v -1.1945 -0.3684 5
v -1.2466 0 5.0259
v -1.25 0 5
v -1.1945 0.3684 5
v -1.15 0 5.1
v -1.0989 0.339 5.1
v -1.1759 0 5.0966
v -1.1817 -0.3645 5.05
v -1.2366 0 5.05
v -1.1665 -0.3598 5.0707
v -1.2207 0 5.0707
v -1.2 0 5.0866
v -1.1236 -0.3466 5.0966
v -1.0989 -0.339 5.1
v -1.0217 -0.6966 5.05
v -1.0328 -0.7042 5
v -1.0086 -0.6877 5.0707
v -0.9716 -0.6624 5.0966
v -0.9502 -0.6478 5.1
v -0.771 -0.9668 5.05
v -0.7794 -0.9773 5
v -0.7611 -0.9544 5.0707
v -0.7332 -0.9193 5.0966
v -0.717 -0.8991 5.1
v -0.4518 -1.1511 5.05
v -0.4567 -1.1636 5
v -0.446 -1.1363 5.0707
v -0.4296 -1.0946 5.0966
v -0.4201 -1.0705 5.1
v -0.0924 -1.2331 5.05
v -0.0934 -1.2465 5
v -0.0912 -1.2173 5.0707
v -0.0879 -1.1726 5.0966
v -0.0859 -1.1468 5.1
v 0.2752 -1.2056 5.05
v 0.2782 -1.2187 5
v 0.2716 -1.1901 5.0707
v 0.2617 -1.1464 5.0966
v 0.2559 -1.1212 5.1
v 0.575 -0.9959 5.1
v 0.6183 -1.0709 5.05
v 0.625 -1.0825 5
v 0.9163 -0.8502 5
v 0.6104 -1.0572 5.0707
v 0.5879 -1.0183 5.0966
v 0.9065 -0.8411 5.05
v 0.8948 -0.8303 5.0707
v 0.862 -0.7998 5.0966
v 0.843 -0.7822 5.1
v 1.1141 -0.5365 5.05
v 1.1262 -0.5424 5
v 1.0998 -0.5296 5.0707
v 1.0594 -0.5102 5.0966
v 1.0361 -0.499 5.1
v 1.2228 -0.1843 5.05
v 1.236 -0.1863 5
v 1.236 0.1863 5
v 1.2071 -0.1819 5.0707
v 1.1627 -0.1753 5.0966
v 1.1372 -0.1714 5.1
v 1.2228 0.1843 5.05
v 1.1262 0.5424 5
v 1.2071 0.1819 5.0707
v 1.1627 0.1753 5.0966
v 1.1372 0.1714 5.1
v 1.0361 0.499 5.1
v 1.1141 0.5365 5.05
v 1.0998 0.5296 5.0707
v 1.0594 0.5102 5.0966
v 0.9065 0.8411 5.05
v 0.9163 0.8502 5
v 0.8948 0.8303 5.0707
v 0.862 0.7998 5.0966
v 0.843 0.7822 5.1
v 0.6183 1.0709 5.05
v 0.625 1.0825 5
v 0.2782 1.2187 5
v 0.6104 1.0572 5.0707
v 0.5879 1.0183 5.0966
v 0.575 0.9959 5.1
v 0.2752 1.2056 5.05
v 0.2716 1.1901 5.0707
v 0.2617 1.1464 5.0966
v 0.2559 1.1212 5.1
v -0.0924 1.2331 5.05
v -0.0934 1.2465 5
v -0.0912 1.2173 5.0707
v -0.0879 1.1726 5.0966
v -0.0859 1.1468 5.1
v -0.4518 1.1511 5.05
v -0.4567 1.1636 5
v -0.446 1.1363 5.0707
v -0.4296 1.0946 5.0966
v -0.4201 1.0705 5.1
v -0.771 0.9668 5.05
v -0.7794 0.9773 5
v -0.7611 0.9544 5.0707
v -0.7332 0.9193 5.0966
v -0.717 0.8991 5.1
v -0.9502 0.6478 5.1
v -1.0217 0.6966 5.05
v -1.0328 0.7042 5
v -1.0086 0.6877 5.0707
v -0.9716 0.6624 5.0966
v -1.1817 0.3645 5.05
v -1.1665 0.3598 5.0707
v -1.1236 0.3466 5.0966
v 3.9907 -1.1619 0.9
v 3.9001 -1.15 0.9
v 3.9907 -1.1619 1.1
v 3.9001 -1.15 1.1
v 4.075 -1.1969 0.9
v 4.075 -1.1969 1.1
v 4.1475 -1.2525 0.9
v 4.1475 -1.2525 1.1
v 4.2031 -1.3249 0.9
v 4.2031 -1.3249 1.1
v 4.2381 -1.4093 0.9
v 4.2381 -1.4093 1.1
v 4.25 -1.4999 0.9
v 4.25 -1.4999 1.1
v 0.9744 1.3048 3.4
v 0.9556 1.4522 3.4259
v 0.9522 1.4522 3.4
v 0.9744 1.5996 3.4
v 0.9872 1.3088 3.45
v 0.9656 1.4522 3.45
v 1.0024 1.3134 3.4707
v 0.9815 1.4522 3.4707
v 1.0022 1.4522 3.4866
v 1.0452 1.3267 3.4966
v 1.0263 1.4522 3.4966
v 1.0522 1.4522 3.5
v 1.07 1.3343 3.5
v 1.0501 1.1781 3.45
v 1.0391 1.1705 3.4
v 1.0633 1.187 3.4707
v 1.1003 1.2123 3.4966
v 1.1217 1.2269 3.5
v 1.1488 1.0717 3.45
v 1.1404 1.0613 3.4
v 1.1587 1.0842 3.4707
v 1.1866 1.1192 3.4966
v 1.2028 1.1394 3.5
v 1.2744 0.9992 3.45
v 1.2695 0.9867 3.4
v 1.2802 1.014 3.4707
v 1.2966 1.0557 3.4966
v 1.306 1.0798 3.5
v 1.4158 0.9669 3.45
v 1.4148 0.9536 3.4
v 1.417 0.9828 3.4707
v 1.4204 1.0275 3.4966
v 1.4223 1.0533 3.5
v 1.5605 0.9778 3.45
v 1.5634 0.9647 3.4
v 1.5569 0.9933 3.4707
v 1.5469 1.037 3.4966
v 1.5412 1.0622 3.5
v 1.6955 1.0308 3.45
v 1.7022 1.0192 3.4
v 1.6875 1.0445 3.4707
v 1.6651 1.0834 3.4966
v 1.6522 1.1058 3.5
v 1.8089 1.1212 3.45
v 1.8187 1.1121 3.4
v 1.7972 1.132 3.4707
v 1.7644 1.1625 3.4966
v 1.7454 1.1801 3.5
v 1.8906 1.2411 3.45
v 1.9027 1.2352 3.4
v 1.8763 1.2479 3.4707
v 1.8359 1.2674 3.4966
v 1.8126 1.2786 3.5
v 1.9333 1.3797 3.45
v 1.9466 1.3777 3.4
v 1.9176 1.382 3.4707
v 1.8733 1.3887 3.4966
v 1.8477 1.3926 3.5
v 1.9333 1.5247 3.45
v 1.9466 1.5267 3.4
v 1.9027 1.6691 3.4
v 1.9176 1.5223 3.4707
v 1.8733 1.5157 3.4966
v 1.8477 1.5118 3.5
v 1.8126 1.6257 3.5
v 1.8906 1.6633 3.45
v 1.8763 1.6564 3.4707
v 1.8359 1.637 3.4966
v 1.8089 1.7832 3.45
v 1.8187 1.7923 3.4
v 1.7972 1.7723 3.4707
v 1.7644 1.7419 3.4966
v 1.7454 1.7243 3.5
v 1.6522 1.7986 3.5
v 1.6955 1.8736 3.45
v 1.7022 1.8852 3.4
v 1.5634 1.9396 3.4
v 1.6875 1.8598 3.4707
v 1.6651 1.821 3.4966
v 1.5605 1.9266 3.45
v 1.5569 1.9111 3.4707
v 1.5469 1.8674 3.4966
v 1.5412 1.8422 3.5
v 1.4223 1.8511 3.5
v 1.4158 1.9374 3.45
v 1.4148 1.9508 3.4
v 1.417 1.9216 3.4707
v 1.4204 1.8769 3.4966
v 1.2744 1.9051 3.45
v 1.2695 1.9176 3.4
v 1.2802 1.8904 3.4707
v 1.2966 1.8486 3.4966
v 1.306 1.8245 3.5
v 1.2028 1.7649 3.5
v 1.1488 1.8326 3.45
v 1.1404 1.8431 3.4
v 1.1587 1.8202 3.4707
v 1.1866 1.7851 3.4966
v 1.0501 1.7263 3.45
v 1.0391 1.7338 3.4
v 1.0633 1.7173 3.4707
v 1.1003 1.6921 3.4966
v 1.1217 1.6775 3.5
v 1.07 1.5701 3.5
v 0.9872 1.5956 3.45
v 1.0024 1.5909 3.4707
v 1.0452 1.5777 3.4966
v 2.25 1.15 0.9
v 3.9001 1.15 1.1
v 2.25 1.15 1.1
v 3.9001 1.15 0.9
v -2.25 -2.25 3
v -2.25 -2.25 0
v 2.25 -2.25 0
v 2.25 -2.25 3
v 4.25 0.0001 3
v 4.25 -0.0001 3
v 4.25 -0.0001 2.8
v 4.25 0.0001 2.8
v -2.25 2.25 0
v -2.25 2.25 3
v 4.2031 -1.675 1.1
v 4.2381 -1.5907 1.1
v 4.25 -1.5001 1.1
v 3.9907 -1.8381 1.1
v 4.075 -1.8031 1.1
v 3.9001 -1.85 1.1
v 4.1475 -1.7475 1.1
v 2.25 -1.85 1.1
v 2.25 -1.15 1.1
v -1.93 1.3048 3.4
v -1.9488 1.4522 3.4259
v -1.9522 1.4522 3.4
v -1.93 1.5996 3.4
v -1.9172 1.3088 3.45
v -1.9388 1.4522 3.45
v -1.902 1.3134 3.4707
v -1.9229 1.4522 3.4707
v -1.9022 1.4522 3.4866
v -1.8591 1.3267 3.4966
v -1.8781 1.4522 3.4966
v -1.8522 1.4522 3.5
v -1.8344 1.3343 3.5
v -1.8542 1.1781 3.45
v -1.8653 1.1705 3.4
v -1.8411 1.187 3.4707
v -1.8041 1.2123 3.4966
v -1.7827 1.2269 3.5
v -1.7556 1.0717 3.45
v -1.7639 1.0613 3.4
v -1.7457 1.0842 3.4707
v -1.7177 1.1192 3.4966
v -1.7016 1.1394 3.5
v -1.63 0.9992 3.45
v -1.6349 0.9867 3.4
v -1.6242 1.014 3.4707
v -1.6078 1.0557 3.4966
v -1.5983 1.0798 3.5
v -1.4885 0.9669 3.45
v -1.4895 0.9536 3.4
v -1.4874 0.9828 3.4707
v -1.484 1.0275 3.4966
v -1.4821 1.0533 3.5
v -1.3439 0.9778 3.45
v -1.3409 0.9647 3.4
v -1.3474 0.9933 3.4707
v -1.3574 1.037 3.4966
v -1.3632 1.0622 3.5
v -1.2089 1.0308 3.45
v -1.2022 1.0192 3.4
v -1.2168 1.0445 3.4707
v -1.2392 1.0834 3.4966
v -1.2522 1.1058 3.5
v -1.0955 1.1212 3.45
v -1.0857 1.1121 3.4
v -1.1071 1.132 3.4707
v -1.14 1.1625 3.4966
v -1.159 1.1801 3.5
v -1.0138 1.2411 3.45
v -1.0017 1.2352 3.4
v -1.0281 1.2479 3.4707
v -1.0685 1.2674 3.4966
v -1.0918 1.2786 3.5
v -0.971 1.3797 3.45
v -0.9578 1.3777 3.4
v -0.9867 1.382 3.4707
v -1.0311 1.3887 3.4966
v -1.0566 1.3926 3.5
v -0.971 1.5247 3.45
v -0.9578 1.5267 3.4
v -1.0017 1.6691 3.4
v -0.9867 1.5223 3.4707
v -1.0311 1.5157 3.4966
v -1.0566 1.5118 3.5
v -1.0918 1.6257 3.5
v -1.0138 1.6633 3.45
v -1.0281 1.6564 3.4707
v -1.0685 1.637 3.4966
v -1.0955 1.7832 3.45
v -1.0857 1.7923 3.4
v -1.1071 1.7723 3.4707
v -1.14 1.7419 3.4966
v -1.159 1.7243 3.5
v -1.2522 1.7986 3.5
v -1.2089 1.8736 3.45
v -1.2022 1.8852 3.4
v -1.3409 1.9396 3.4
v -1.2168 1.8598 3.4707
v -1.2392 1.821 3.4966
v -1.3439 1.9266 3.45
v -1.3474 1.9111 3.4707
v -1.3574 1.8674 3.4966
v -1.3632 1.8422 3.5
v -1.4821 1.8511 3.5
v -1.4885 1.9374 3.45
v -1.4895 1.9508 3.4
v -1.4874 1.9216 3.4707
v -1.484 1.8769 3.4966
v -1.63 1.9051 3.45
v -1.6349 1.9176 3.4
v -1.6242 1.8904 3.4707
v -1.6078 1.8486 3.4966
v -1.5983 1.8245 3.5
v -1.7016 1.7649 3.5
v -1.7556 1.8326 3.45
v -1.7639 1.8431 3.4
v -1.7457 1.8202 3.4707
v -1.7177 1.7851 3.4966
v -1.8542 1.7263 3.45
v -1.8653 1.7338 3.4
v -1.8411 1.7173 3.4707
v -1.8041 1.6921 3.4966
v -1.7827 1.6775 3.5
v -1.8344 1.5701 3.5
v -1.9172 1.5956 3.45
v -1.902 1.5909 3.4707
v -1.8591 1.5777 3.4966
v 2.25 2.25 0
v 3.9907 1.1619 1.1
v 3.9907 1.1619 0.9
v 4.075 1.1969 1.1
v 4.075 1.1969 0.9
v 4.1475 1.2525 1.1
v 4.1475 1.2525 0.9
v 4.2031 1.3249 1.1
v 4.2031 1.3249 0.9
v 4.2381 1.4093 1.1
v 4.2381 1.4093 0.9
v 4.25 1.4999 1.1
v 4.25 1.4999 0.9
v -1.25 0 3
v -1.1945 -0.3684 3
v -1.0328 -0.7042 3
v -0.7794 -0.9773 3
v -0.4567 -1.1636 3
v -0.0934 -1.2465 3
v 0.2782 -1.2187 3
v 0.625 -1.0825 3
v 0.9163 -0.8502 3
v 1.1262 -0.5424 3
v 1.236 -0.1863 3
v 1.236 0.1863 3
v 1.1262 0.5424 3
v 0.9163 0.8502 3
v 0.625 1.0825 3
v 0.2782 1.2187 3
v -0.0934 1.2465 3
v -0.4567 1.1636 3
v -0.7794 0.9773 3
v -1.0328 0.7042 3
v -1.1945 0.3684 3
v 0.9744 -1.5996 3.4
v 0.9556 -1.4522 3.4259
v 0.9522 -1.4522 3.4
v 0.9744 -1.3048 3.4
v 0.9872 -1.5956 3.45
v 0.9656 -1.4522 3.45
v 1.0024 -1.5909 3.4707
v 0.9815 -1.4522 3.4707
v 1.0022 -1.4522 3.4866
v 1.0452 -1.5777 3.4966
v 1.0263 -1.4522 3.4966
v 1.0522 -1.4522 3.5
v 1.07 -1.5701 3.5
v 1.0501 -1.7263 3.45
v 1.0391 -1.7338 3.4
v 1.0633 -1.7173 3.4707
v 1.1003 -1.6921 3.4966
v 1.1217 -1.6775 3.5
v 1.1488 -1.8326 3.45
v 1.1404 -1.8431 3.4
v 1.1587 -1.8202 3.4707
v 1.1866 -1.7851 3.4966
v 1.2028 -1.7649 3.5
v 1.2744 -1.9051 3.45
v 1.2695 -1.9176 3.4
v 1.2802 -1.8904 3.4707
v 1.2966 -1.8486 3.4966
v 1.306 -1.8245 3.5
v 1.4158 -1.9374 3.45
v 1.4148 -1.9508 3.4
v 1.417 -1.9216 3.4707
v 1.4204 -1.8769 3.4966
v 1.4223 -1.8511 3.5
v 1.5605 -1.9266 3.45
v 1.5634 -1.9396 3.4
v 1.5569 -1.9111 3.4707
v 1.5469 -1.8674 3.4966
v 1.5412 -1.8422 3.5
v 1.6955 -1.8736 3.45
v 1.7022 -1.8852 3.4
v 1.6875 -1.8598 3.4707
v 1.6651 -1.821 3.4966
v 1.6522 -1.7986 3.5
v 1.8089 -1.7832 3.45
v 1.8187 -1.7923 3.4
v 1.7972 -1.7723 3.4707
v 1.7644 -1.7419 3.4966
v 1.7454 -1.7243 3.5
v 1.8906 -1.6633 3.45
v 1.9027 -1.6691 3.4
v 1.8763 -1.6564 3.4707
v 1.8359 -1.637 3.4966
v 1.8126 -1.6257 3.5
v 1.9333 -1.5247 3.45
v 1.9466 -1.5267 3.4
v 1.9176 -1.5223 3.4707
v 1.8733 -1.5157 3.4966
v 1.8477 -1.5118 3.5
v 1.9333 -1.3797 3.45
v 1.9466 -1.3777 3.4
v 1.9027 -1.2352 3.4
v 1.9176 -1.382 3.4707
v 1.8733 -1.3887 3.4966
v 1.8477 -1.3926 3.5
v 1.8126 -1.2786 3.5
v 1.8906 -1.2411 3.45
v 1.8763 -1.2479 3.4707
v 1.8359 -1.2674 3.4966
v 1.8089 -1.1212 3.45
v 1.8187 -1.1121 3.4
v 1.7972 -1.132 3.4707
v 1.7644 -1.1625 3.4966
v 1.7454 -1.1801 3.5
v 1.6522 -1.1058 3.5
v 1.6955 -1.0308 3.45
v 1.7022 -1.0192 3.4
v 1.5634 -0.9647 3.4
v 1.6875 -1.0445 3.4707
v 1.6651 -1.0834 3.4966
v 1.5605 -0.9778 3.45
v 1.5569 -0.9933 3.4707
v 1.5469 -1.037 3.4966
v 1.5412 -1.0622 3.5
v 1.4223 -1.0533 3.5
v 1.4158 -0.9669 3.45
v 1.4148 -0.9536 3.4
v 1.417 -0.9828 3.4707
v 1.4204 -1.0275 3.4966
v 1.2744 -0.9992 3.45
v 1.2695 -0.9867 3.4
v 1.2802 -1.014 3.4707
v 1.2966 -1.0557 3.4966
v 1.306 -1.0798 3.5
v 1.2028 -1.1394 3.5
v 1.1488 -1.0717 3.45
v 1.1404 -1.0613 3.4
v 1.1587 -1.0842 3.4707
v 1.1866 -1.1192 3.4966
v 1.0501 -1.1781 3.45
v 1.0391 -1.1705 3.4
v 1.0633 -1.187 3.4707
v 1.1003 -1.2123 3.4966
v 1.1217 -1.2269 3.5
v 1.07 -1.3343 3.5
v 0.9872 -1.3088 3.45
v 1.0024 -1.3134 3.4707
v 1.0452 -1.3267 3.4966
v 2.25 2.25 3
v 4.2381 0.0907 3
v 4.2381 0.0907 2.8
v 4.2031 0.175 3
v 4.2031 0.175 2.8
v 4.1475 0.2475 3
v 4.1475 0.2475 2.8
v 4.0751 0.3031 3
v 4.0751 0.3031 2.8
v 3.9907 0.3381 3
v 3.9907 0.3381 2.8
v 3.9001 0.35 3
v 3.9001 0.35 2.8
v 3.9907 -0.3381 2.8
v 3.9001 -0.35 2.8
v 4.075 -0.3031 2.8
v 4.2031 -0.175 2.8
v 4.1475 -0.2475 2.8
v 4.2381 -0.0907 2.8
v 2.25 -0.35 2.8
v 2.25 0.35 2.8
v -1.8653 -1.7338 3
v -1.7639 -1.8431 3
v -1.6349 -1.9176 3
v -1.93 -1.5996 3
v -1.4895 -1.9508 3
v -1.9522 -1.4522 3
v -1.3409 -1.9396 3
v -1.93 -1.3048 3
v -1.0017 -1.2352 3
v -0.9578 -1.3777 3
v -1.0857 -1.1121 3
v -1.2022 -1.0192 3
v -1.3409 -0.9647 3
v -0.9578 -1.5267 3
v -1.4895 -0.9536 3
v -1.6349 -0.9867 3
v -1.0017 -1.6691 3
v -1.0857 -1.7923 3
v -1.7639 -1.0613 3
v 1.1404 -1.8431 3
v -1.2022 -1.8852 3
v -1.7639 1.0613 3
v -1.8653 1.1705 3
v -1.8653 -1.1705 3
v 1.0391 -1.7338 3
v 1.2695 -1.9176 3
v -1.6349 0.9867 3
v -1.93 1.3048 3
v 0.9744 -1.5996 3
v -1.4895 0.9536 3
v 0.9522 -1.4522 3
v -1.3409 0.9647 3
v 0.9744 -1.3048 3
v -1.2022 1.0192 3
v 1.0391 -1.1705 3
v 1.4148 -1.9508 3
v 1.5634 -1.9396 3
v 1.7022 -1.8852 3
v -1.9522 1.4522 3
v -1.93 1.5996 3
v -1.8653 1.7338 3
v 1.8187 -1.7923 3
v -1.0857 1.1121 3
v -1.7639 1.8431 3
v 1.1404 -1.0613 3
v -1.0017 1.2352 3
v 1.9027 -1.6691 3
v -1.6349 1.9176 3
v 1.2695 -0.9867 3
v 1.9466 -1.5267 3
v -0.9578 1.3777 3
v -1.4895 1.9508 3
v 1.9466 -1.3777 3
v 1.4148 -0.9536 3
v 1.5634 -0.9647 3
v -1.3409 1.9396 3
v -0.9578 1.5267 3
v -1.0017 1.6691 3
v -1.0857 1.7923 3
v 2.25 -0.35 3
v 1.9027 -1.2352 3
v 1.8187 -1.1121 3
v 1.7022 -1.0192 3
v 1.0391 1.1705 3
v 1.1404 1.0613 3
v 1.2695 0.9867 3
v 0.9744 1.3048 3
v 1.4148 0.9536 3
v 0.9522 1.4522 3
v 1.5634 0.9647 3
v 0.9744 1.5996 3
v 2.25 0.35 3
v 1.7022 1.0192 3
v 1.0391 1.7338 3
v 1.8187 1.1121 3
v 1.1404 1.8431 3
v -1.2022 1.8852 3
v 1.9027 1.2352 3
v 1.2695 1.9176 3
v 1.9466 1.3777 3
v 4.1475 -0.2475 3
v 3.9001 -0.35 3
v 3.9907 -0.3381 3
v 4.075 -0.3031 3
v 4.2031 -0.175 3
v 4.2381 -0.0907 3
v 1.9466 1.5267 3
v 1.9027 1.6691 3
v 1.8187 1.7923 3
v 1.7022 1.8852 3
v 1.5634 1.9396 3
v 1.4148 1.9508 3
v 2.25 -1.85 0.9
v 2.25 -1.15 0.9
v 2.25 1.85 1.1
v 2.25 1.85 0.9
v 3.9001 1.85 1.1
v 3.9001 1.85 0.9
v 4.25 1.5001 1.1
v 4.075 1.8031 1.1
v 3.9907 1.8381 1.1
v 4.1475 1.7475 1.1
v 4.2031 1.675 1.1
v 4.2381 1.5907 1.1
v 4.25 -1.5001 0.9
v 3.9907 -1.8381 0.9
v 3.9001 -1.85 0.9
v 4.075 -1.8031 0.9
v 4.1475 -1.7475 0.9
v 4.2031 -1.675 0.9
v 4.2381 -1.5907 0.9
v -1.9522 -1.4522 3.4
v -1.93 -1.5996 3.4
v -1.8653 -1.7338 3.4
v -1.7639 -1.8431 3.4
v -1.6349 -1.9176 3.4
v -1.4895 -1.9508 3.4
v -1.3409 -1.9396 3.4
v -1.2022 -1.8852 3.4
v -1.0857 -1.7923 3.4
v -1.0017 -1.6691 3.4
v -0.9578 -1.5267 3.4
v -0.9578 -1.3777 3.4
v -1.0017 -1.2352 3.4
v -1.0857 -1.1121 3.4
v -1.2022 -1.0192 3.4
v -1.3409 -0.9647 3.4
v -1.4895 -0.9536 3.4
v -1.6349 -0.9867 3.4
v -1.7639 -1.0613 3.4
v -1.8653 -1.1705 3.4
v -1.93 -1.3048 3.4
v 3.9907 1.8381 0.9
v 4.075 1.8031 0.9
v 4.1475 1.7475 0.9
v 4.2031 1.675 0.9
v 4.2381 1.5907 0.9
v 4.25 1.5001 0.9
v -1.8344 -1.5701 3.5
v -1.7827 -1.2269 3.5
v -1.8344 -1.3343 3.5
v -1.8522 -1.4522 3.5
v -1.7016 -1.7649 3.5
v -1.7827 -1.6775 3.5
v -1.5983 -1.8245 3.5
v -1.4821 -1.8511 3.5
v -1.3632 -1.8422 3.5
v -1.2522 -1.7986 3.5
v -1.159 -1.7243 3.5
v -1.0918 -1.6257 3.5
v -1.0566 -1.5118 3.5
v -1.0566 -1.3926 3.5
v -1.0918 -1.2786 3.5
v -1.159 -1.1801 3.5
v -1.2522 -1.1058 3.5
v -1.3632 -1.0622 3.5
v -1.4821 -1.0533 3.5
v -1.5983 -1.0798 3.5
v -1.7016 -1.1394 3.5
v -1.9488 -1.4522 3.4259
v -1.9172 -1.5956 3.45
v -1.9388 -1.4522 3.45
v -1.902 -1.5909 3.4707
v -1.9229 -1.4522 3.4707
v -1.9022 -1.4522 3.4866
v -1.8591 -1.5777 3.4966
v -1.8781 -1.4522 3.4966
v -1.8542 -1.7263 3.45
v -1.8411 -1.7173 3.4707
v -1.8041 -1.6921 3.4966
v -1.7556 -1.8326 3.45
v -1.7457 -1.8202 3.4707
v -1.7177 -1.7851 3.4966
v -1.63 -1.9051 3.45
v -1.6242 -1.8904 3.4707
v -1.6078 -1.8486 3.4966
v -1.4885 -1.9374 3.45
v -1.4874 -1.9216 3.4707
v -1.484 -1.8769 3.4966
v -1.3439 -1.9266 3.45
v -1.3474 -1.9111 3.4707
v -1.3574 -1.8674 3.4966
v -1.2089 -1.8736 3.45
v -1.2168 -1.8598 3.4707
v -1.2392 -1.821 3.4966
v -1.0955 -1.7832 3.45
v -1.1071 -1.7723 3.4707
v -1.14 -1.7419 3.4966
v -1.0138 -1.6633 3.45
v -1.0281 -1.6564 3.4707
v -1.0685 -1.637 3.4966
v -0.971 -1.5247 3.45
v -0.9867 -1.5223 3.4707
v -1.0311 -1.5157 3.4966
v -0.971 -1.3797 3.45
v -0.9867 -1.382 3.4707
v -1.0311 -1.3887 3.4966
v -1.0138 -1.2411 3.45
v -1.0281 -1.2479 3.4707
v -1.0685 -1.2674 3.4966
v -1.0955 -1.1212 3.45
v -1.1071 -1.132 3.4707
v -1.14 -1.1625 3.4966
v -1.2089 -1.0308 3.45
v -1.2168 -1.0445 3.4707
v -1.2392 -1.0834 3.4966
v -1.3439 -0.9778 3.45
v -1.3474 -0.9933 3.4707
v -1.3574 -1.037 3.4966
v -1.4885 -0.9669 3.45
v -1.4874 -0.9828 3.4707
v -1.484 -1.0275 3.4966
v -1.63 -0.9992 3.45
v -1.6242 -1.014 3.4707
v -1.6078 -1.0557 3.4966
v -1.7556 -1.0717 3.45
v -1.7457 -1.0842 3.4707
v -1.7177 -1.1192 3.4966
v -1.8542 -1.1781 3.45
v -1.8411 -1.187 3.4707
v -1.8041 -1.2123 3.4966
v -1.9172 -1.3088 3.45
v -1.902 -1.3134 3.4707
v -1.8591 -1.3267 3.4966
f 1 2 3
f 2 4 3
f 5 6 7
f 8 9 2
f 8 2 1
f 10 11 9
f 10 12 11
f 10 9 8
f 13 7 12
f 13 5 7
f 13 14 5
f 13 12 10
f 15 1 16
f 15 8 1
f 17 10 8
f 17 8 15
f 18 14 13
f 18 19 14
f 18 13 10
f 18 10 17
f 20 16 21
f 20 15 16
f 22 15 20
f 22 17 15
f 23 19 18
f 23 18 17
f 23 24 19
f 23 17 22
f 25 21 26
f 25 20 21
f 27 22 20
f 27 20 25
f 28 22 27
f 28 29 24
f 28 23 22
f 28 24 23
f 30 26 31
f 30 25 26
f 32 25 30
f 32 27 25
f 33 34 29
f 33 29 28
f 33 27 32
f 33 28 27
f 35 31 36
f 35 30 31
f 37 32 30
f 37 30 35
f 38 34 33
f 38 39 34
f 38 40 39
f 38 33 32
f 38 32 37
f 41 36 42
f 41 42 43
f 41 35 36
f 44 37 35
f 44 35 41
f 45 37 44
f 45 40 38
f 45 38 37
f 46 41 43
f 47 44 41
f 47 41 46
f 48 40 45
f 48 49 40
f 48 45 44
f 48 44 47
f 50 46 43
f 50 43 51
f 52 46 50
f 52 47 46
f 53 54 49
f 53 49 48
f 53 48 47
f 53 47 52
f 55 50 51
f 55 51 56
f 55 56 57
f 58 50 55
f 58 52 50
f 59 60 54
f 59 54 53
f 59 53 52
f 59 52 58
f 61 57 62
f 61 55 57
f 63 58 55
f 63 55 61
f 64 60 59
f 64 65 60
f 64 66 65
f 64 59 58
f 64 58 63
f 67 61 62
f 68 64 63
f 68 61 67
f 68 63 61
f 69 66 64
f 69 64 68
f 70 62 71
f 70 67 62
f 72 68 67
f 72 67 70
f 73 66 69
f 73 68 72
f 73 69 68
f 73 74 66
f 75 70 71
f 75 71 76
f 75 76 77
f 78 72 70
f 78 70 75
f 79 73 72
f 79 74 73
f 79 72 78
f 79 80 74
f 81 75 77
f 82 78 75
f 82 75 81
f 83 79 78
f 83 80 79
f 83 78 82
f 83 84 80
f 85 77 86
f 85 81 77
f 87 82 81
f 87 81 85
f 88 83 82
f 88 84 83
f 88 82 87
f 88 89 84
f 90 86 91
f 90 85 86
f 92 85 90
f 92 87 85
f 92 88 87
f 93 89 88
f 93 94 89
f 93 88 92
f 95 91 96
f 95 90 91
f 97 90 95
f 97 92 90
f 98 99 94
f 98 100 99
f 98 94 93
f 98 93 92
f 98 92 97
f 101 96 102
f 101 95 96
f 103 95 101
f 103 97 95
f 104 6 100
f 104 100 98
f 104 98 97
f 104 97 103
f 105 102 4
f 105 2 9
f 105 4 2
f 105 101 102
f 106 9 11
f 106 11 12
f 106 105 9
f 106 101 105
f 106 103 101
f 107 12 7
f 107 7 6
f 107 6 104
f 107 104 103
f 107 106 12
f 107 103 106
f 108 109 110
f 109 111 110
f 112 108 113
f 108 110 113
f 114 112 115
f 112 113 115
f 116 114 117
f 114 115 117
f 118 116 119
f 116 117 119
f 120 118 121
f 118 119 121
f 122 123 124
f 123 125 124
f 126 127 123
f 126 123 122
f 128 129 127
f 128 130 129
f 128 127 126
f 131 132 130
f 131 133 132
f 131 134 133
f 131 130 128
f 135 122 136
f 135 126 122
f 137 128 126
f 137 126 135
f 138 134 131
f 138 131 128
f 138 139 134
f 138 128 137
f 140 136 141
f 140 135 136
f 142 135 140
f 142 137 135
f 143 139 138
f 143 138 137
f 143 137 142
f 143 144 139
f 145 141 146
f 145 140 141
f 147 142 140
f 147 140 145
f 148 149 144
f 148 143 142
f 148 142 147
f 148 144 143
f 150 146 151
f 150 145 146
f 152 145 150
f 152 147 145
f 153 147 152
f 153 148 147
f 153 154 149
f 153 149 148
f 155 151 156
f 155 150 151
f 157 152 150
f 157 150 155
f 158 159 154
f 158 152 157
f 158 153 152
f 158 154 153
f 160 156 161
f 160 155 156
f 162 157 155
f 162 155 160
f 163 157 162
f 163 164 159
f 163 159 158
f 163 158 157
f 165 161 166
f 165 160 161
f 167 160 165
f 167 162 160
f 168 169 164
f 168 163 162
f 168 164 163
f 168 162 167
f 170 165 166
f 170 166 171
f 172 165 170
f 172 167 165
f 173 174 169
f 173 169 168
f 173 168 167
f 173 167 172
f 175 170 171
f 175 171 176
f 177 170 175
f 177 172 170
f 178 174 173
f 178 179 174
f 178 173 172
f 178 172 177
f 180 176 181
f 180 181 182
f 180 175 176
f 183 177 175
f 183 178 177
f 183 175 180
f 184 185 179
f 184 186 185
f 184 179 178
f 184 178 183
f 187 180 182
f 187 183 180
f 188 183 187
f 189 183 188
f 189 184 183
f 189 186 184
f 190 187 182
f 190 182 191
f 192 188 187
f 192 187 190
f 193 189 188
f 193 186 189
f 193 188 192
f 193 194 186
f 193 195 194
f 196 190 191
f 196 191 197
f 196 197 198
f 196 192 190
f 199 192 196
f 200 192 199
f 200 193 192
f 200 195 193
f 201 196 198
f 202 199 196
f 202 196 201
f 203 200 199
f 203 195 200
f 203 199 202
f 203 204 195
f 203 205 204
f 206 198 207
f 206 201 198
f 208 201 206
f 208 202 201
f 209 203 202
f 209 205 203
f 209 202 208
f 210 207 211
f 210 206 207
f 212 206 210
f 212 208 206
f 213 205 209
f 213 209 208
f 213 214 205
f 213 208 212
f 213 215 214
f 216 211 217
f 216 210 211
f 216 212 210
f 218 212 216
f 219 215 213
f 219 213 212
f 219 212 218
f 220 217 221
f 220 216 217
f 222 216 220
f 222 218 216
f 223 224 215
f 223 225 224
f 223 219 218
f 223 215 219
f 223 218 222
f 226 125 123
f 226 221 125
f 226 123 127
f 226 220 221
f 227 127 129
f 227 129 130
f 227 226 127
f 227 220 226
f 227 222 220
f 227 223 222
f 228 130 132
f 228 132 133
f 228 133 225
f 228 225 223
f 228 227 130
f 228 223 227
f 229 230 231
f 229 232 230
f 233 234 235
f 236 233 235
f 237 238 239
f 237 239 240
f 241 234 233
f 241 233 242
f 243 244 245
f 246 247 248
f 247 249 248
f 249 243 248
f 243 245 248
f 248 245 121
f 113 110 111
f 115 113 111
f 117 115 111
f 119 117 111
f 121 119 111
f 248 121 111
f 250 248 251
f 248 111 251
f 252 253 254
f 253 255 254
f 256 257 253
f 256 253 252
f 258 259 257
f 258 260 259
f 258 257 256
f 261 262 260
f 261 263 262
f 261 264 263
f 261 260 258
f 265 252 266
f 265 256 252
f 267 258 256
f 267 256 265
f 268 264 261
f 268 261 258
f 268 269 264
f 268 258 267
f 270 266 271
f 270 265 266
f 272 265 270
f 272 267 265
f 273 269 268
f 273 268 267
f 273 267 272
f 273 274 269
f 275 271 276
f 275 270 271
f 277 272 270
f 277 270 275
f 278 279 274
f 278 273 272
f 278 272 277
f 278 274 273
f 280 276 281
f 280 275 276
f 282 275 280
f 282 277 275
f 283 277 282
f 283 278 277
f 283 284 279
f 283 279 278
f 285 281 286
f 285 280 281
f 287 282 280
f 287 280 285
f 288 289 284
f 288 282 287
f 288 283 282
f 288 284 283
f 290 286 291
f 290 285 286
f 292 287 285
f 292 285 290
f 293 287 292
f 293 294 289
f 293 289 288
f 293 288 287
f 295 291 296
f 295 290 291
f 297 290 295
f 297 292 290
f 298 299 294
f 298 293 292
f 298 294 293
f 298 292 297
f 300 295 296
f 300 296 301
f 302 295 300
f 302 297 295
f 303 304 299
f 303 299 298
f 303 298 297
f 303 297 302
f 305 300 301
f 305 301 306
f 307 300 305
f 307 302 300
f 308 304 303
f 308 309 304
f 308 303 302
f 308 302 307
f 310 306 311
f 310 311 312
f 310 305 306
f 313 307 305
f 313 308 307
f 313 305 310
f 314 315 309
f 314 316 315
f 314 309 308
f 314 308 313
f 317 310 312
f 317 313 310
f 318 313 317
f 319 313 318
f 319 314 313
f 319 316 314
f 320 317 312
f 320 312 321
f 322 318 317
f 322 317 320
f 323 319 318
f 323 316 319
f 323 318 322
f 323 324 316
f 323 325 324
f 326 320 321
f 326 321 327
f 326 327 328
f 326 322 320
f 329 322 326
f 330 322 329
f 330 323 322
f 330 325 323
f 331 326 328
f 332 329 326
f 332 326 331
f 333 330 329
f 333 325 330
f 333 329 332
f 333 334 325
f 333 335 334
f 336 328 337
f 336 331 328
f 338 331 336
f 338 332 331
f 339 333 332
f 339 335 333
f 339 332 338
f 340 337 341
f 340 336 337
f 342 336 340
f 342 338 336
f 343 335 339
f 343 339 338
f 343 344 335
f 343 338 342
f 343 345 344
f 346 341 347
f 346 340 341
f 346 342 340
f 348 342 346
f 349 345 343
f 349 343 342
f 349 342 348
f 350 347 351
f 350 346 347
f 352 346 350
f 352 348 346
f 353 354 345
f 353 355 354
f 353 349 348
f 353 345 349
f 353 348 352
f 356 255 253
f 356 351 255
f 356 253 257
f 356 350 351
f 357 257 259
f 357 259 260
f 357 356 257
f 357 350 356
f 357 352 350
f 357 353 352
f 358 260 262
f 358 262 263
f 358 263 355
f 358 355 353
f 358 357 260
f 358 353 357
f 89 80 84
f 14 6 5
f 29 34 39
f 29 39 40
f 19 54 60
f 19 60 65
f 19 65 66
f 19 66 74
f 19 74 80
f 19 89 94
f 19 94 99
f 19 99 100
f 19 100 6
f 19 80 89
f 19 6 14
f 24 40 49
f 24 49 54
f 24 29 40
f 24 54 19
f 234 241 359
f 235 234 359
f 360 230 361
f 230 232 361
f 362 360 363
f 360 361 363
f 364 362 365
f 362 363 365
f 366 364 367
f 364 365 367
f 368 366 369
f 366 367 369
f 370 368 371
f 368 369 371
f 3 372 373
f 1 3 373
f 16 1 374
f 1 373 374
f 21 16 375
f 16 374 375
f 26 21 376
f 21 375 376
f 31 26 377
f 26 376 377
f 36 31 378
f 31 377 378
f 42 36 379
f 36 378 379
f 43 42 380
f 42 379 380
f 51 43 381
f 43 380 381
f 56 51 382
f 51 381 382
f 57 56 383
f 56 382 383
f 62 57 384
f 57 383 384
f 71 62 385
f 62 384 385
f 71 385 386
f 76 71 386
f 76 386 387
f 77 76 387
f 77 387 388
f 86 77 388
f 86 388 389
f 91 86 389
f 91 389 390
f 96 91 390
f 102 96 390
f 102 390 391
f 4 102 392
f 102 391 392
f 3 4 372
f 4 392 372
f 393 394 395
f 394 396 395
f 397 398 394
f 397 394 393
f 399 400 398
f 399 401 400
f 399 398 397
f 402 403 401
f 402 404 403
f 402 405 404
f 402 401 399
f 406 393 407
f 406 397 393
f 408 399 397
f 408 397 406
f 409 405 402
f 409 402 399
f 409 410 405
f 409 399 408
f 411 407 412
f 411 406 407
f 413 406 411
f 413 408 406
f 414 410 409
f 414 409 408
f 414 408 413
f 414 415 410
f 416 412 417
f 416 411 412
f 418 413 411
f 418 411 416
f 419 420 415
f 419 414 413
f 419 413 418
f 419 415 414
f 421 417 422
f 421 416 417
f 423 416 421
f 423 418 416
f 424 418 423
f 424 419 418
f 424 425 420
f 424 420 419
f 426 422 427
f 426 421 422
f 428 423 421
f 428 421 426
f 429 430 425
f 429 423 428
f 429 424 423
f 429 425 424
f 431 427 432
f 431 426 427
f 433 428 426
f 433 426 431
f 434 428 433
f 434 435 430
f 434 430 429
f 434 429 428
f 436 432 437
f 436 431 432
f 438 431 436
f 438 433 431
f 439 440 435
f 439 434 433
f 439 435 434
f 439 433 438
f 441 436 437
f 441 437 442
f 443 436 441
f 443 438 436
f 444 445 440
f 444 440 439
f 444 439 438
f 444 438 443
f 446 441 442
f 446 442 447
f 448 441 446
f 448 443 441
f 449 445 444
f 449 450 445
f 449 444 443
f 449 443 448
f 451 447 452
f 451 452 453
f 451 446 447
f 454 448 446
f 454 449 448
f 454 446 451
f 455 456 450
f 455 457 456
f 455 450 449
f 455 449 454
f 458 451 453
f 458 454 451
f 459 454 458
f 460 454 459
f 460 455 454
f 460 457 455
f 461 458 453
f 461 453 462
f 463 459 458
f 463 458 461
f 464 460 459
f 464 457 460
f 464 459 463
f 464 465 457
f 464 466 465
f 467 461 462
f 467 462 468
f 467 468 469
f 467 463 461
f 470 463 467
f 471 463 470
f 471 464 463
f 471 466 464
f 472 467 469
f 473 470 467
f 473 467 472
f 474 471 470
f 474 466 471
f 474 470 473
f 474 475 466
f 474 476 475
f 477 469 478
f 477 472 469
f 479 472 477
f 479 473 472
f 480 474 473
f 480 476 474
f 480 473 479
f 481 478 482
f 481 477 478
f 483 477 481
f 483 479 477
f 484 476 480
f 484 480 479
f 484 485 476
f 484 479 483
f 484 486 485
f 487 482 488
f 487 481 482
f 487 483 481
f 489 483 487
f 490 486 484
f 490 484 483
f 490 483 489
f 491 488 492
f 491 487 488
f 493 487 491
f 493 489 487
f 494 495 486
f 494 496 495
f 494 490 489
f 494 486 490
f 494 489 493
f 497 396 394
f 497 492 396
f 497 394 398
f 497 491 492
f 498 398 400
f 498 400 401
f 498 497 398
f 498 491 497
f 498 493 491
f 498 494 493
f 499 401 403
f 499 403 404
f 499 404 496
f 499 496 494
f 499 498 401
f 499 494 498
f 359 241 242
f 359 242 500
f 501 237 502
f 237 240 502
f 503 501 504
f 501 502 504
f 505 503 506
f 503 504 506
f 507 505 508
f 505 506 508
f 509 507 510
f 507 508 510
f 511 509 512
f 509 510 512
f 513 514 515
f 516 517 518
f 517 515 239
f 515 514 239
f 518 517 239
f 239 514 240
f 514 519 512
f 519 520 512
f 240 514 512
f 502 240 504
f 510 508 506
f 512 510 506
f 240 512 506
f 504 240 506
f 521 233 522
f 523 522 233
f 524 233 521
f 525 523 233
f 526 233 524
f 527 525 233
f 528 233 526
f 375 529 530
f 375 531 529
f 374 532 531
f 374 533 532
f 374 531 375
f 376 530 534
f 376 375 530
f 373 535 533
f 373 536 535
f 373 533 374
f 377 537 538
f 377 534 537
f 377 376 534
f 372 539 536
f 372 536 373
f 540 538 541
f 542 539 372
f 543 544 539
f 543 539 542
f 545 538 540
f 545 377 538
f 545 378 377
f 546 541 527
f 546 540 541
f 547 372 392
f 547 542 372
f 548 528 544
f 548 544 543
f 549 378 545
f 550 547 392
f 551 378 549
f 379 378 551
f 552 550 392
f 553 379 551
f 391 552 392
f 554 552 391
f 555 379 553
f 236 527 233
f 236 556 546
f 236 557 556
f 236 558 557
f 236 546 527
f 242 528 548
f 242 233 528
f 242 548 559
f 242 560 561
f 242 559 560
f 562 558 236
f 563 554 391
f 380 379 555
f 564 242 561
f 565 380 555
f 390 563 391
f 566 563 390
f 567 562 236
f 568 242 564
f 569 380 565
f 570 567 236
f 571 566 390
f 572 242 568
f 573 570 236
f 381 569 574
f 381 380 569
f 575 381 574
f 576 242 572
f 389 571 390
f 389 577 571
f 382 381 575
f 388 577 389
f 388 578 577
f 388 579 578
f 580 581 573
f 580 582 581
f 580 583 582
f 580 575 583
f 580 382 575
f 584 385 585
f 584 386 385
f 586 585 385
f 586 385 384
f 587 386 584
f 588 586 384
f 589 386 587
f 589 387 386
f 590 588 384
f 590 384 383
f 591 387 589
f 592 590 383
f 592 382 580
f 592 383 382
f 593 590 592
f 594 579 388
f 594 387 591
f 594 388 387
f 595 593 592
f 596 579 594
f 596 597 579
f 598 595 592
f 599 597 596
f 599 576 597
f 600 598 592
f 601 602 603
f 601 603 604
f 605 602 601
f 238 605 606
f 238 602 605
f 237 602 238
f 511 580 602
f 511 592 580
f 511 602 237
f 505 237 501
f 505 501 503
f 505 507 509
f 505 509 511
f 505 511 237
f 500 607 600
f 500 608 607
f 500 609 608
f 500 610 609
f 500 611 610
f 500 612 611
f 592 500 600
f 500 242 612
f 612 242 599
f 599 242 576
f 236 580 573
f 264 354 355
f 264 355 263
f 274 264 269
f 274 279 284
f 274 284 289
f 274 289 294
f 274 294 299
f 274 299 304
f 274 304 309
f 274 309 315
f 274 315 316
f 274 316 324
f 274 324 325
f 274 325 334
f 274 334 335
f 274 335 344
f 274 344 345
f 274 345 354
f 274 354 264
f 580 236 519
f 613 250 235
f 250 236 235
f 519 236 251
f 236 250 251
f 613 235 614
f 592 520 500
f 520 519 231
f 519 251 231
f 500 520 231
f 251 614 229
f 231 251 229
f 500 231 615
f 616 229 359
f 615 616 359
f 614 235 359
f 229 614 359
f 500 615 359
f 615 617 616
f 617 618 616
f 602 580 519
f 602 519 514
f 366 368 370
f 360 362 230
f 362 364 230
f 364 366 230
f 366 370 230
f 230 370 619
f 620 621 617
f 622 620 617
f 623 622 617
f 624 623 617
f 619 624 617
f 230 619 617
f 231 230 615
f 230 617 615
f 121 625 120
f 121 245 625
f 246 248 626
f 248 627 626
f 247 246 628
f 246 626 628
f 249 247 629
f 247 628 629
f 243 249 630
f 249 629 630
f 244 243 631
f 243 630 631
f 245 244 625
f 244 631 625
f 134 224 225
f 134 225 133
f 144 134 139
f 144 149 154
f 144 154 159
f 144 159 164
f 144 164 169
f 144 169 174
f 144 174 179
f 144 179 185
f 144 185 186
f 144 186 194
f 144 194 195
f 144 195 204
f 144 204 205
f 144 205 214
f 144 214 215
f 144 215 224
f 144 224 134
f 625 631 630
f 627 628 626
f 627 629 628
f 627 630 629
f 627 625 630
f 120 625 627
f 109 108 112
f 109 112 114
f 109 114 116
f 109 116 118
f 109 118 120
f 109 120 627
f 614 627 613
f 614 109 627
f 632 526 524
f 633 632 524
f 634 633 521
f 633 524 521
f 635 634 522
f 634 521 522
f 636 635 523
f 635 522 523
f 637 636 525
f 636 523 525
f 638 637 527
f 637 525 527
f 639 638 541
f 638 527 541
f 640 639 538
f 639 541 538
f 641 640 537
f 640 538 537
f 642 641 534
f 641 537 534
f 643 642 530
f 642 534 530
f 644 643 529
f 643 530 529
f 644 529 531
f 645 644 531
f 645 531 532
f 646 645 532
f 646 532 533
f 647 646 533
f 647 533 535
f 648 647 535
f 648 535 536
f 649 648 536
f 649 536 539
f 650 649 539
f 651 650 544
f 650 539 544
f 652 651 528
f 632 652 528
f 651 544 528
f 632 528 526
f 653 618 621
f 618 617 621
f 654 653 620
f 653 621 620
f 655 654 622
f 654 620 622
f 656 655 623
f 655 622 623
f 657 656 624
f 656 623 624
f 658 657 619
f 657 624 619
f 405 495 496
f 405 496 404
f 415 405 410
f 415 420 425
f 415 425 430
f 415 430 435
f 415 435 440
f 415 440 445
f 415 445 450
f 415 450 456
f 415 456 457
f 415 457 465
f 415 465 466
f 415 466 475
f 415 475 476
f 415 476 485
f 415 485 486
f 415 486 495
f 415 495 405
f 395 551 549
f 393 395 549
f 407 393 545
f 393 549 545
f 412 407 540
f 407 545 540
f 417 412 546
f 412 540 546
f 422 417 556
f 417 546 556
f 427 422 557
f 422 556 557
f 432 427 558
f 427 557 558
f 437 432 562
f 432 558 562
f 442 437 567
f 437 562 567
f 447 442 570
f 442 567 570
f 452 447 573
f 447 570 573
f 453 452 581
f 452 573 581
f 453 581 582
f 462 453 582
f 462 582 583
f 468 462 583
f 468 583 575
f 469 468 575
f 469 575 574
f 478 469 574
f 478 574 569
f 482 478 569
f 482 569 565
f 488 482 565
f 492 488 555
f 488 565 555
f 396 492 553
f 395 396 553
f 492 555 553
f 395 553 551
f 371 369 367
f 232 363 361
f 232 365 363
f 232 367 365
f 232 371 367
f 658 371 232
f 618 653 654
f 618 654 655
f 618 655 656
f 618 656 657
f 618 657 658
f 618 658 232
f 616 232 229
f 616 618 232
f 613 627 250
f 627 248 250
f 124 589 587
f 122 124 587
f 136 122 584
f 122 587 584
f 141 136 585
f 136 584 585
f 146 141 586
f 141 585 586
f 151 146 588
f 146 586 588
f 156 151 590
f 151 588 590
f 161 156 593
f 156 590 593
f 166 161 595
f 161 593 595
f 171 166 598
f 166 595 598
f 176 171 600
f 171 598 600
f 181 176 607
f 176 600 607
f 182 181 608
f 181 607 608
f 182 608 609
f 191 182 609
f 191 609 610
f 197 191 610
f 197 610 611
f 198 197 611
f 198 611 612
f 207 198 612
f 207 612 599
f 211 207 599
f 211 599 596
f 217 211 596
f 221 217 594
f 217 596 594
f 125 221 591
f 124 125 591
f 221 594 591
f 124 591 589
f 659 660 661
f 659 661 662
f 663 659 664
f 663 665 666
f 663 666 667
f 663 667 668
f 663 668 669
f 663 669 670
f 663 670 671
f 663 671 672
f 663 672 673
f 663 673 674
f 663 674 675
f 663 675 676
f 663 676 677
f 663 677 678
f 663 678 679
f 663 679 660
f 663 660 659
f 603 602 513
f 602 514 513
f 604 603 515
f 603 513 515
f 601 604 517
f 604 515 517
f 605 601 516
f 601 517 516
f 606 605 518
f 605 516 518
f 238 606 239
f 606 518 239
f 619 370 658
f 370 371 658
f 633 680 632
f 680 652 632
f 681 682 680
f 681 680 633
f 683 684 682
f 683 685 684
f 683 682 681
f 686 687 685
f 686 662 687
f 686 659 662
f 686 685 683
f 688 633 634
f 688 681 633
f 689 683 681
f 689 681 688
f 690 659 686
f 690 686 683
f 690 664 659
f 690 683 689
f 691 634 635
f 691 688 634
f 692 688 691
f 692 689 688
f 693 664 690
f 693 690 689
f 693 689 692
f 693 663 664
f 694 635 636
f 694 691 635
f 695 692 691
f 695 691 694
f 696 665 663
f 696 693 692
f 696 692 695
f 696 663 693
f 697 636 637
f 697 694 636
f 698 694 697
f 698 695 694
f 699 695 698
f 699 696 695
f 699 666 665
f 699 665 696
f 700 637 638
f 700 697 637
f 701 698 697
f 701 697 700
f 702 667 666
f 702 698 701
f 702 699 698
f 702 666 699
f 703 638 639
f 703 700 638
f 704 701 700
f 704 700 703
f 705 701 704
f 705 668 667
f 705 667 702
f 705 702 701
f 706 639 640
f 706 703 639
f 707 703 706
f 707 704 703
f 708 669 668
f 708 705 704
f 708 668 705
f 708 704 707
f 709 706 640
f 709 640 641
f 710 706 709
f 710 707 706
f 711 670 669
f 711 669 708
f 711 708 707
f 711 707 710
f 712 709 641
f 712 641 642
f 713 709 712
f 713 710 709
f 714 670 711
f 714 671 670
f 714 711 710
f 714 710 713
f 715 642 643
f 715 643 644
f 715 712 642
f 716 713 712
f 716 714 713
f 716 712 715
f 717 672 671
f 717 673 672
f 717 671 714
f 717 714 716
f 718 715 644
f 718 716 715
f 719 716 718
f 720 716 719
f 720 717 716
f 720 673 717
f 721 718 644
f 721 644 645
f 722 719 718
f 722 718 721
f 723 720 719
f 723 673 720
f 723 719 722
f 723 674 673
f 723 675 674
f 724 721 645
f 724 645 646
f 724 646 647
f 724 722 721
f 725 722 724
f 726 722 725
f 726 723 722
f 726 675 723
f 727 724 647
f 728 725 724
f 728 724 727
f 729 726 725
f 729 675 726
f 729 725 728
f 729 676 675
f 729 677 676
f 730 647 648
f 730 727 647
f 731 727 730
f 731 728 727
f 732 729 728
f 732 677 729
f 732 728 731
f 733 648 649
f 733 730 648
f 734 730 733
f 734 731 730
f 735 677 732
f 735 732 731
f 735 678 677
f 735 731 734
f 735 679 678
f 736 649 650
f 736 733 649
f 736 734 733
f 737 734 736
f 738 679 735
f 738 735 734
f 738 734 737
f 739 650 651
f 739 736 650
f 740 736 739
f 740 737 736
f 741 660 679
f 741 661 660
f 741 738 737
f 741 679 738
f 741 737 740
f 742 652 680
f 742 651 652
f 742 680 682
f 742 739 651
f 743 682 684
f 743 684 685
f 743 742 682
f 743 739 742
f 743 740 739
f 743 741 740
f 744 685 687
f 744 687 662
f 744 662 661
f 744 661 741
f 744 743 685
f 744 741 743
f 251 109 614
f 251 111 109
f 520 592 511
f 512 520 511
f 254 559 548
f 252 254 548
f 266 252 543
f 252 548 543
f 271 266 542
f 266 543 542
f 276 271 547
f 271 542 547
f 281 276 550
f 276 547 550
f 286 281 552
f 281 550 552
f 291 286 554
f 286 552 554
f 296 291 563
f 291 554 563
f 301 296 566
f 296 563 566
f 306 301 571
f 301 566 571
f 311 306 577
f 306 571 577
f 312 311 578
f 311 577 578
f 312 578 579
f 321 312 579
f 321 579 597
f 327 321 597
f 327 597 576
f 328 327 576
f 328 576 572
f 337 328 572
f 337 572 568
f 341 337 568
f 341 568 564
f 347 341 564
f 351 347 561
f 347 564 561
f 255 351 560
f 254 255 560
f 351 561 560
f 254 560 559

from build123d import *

# Parameters (mm, degrees)
SKETCH1_W           = 4.5
SKETCH1_H           = 4.5
BOSS_EXTRUDE1_DEPTH = 3
SKETCH4_R           = 0.5
BOSS_EXTRUDE3_DEPTH = 0.5
FILLET1_R           = 0.1
SKETCH5_R           = 1.25
BOSS_EXTRUDE4_DEPTH = 2.1
FILLET2_R           = 0.1
SKETCH6_W           = 2
SKETCH6_H           = 0.7
BOSS_EXTRUDE5_DEPTH = 0.2
SKETCH7_W           = 2
SKETCH7_H           = 0.7
BOSS_EXTRUDE6_DEPTH = 0.1
FILLET3_R           = 0.35


with BuildPart() as part:
    # Sketch1 → Boss-Extrude1 (new body)
    with BuildSketch(Plane.XY):
        Rectangle(SKETCH1_W, SKETCH1_H)
    extrude(amount=BOSS_EXTRUDE1_DEPTH)

    # Sketch4 → Boss-Extrude3 (add)
    with BuildSketch(Plane.XY.offset(3)):
        with Locations(Location((-1.45218189, 1.45218189, 0), (0, 0, 180))):
            Circle(SKETCH4_R)
        with Locations(Location((1.45218189, 1.45218189, 0), (0, 0, 180))):
            Circle(SKETCH4_R)
        with Locations(Location((1.45218189, -1.45218189, 0), (0, 0, 180))):
            Circle(SKETCH4_R)
        with Locations(Location((-1.45218189, -1.45218189, 0), (0, 0, 180))):
            Circle(SKETCH4_R)
    extrude(amount=BOSS_EXTRUDE3_DEPTH)

    # Fillet1
    fillet1_edges = [part.edges().sort_by_distance(p)[0] for p in [
        (-0.95218189, 1.45218189, 3.5),
        (1.95218189, 1.45218189, 3.5),
        (1.95218189, -1.45218189, 3.5),
        (-0.95218189, -1.45218189, 3.5),
    ]]
    fillet(fillet1_edges, radius=FILLET1_R)

    # Sketch5 → Boss-Extrude4 (add)
    with BuildSketch(Plane.XY.offset(3)):
        with Locations(Location((0, 0, 0), (0, 0, 180))):
            Circle(SKETCH5_R)
    extrude(amount=BOSS_EXTRUDE4_DEPTH)

    # Fillet2
    fillet2_edges = [part.edges().sort_by_distance(p)[0] for p in [
        (1.25, 0, 5.1),
    ]]
    fillet(fillet2_edges, radius=FILLET2_R)

    # Sketch6 → Boss-Extrude5 (add)
    with BuildSketch(Plane.XY.offset(3)):
        with Locations((3.25, 0)):
            Rectangle(SKETCH6_W, SKETCH6_H)
    extrude(amount=-BOSS_EXTRUDE5_DEPTH)

    # Sketch7 → Boss-Extrude6 (add, symmetric)
    with BuildSketch(Plane(origin=(0, 0, 1), x_dir=(-1, 0, 0), z_dir=(0, 0, -1))):
        with Locations((-3.25, -1.5)):
            Rectangle(SKETCH7_W, SKETCH7_H)
        with Locations((-3.25, 1.5)):
            Rectangle(SKETCH7_W, SKETCH7_H)
    extrude(amount=BOSS_EXTRUDE6_DEPTH, both=True)

    # Fillet3
    fillet3_edges = [part.edges().sort_by_distance(p)[0] for p in [
        (4.25, 1.85, 1),
        (4.25, 1.15, 1),
        (4.25, -0.35, 2.9),
        (4.25, 0.35, 2.9),
        (4.25, -1.15, 1),
        (4.25, -1.85, 1),
    ]]
    fillet(fillet3_edges, radius=FILLET3_R - 0.0001)  # a hair under: the kernel refuses the full size


solid = part.part
